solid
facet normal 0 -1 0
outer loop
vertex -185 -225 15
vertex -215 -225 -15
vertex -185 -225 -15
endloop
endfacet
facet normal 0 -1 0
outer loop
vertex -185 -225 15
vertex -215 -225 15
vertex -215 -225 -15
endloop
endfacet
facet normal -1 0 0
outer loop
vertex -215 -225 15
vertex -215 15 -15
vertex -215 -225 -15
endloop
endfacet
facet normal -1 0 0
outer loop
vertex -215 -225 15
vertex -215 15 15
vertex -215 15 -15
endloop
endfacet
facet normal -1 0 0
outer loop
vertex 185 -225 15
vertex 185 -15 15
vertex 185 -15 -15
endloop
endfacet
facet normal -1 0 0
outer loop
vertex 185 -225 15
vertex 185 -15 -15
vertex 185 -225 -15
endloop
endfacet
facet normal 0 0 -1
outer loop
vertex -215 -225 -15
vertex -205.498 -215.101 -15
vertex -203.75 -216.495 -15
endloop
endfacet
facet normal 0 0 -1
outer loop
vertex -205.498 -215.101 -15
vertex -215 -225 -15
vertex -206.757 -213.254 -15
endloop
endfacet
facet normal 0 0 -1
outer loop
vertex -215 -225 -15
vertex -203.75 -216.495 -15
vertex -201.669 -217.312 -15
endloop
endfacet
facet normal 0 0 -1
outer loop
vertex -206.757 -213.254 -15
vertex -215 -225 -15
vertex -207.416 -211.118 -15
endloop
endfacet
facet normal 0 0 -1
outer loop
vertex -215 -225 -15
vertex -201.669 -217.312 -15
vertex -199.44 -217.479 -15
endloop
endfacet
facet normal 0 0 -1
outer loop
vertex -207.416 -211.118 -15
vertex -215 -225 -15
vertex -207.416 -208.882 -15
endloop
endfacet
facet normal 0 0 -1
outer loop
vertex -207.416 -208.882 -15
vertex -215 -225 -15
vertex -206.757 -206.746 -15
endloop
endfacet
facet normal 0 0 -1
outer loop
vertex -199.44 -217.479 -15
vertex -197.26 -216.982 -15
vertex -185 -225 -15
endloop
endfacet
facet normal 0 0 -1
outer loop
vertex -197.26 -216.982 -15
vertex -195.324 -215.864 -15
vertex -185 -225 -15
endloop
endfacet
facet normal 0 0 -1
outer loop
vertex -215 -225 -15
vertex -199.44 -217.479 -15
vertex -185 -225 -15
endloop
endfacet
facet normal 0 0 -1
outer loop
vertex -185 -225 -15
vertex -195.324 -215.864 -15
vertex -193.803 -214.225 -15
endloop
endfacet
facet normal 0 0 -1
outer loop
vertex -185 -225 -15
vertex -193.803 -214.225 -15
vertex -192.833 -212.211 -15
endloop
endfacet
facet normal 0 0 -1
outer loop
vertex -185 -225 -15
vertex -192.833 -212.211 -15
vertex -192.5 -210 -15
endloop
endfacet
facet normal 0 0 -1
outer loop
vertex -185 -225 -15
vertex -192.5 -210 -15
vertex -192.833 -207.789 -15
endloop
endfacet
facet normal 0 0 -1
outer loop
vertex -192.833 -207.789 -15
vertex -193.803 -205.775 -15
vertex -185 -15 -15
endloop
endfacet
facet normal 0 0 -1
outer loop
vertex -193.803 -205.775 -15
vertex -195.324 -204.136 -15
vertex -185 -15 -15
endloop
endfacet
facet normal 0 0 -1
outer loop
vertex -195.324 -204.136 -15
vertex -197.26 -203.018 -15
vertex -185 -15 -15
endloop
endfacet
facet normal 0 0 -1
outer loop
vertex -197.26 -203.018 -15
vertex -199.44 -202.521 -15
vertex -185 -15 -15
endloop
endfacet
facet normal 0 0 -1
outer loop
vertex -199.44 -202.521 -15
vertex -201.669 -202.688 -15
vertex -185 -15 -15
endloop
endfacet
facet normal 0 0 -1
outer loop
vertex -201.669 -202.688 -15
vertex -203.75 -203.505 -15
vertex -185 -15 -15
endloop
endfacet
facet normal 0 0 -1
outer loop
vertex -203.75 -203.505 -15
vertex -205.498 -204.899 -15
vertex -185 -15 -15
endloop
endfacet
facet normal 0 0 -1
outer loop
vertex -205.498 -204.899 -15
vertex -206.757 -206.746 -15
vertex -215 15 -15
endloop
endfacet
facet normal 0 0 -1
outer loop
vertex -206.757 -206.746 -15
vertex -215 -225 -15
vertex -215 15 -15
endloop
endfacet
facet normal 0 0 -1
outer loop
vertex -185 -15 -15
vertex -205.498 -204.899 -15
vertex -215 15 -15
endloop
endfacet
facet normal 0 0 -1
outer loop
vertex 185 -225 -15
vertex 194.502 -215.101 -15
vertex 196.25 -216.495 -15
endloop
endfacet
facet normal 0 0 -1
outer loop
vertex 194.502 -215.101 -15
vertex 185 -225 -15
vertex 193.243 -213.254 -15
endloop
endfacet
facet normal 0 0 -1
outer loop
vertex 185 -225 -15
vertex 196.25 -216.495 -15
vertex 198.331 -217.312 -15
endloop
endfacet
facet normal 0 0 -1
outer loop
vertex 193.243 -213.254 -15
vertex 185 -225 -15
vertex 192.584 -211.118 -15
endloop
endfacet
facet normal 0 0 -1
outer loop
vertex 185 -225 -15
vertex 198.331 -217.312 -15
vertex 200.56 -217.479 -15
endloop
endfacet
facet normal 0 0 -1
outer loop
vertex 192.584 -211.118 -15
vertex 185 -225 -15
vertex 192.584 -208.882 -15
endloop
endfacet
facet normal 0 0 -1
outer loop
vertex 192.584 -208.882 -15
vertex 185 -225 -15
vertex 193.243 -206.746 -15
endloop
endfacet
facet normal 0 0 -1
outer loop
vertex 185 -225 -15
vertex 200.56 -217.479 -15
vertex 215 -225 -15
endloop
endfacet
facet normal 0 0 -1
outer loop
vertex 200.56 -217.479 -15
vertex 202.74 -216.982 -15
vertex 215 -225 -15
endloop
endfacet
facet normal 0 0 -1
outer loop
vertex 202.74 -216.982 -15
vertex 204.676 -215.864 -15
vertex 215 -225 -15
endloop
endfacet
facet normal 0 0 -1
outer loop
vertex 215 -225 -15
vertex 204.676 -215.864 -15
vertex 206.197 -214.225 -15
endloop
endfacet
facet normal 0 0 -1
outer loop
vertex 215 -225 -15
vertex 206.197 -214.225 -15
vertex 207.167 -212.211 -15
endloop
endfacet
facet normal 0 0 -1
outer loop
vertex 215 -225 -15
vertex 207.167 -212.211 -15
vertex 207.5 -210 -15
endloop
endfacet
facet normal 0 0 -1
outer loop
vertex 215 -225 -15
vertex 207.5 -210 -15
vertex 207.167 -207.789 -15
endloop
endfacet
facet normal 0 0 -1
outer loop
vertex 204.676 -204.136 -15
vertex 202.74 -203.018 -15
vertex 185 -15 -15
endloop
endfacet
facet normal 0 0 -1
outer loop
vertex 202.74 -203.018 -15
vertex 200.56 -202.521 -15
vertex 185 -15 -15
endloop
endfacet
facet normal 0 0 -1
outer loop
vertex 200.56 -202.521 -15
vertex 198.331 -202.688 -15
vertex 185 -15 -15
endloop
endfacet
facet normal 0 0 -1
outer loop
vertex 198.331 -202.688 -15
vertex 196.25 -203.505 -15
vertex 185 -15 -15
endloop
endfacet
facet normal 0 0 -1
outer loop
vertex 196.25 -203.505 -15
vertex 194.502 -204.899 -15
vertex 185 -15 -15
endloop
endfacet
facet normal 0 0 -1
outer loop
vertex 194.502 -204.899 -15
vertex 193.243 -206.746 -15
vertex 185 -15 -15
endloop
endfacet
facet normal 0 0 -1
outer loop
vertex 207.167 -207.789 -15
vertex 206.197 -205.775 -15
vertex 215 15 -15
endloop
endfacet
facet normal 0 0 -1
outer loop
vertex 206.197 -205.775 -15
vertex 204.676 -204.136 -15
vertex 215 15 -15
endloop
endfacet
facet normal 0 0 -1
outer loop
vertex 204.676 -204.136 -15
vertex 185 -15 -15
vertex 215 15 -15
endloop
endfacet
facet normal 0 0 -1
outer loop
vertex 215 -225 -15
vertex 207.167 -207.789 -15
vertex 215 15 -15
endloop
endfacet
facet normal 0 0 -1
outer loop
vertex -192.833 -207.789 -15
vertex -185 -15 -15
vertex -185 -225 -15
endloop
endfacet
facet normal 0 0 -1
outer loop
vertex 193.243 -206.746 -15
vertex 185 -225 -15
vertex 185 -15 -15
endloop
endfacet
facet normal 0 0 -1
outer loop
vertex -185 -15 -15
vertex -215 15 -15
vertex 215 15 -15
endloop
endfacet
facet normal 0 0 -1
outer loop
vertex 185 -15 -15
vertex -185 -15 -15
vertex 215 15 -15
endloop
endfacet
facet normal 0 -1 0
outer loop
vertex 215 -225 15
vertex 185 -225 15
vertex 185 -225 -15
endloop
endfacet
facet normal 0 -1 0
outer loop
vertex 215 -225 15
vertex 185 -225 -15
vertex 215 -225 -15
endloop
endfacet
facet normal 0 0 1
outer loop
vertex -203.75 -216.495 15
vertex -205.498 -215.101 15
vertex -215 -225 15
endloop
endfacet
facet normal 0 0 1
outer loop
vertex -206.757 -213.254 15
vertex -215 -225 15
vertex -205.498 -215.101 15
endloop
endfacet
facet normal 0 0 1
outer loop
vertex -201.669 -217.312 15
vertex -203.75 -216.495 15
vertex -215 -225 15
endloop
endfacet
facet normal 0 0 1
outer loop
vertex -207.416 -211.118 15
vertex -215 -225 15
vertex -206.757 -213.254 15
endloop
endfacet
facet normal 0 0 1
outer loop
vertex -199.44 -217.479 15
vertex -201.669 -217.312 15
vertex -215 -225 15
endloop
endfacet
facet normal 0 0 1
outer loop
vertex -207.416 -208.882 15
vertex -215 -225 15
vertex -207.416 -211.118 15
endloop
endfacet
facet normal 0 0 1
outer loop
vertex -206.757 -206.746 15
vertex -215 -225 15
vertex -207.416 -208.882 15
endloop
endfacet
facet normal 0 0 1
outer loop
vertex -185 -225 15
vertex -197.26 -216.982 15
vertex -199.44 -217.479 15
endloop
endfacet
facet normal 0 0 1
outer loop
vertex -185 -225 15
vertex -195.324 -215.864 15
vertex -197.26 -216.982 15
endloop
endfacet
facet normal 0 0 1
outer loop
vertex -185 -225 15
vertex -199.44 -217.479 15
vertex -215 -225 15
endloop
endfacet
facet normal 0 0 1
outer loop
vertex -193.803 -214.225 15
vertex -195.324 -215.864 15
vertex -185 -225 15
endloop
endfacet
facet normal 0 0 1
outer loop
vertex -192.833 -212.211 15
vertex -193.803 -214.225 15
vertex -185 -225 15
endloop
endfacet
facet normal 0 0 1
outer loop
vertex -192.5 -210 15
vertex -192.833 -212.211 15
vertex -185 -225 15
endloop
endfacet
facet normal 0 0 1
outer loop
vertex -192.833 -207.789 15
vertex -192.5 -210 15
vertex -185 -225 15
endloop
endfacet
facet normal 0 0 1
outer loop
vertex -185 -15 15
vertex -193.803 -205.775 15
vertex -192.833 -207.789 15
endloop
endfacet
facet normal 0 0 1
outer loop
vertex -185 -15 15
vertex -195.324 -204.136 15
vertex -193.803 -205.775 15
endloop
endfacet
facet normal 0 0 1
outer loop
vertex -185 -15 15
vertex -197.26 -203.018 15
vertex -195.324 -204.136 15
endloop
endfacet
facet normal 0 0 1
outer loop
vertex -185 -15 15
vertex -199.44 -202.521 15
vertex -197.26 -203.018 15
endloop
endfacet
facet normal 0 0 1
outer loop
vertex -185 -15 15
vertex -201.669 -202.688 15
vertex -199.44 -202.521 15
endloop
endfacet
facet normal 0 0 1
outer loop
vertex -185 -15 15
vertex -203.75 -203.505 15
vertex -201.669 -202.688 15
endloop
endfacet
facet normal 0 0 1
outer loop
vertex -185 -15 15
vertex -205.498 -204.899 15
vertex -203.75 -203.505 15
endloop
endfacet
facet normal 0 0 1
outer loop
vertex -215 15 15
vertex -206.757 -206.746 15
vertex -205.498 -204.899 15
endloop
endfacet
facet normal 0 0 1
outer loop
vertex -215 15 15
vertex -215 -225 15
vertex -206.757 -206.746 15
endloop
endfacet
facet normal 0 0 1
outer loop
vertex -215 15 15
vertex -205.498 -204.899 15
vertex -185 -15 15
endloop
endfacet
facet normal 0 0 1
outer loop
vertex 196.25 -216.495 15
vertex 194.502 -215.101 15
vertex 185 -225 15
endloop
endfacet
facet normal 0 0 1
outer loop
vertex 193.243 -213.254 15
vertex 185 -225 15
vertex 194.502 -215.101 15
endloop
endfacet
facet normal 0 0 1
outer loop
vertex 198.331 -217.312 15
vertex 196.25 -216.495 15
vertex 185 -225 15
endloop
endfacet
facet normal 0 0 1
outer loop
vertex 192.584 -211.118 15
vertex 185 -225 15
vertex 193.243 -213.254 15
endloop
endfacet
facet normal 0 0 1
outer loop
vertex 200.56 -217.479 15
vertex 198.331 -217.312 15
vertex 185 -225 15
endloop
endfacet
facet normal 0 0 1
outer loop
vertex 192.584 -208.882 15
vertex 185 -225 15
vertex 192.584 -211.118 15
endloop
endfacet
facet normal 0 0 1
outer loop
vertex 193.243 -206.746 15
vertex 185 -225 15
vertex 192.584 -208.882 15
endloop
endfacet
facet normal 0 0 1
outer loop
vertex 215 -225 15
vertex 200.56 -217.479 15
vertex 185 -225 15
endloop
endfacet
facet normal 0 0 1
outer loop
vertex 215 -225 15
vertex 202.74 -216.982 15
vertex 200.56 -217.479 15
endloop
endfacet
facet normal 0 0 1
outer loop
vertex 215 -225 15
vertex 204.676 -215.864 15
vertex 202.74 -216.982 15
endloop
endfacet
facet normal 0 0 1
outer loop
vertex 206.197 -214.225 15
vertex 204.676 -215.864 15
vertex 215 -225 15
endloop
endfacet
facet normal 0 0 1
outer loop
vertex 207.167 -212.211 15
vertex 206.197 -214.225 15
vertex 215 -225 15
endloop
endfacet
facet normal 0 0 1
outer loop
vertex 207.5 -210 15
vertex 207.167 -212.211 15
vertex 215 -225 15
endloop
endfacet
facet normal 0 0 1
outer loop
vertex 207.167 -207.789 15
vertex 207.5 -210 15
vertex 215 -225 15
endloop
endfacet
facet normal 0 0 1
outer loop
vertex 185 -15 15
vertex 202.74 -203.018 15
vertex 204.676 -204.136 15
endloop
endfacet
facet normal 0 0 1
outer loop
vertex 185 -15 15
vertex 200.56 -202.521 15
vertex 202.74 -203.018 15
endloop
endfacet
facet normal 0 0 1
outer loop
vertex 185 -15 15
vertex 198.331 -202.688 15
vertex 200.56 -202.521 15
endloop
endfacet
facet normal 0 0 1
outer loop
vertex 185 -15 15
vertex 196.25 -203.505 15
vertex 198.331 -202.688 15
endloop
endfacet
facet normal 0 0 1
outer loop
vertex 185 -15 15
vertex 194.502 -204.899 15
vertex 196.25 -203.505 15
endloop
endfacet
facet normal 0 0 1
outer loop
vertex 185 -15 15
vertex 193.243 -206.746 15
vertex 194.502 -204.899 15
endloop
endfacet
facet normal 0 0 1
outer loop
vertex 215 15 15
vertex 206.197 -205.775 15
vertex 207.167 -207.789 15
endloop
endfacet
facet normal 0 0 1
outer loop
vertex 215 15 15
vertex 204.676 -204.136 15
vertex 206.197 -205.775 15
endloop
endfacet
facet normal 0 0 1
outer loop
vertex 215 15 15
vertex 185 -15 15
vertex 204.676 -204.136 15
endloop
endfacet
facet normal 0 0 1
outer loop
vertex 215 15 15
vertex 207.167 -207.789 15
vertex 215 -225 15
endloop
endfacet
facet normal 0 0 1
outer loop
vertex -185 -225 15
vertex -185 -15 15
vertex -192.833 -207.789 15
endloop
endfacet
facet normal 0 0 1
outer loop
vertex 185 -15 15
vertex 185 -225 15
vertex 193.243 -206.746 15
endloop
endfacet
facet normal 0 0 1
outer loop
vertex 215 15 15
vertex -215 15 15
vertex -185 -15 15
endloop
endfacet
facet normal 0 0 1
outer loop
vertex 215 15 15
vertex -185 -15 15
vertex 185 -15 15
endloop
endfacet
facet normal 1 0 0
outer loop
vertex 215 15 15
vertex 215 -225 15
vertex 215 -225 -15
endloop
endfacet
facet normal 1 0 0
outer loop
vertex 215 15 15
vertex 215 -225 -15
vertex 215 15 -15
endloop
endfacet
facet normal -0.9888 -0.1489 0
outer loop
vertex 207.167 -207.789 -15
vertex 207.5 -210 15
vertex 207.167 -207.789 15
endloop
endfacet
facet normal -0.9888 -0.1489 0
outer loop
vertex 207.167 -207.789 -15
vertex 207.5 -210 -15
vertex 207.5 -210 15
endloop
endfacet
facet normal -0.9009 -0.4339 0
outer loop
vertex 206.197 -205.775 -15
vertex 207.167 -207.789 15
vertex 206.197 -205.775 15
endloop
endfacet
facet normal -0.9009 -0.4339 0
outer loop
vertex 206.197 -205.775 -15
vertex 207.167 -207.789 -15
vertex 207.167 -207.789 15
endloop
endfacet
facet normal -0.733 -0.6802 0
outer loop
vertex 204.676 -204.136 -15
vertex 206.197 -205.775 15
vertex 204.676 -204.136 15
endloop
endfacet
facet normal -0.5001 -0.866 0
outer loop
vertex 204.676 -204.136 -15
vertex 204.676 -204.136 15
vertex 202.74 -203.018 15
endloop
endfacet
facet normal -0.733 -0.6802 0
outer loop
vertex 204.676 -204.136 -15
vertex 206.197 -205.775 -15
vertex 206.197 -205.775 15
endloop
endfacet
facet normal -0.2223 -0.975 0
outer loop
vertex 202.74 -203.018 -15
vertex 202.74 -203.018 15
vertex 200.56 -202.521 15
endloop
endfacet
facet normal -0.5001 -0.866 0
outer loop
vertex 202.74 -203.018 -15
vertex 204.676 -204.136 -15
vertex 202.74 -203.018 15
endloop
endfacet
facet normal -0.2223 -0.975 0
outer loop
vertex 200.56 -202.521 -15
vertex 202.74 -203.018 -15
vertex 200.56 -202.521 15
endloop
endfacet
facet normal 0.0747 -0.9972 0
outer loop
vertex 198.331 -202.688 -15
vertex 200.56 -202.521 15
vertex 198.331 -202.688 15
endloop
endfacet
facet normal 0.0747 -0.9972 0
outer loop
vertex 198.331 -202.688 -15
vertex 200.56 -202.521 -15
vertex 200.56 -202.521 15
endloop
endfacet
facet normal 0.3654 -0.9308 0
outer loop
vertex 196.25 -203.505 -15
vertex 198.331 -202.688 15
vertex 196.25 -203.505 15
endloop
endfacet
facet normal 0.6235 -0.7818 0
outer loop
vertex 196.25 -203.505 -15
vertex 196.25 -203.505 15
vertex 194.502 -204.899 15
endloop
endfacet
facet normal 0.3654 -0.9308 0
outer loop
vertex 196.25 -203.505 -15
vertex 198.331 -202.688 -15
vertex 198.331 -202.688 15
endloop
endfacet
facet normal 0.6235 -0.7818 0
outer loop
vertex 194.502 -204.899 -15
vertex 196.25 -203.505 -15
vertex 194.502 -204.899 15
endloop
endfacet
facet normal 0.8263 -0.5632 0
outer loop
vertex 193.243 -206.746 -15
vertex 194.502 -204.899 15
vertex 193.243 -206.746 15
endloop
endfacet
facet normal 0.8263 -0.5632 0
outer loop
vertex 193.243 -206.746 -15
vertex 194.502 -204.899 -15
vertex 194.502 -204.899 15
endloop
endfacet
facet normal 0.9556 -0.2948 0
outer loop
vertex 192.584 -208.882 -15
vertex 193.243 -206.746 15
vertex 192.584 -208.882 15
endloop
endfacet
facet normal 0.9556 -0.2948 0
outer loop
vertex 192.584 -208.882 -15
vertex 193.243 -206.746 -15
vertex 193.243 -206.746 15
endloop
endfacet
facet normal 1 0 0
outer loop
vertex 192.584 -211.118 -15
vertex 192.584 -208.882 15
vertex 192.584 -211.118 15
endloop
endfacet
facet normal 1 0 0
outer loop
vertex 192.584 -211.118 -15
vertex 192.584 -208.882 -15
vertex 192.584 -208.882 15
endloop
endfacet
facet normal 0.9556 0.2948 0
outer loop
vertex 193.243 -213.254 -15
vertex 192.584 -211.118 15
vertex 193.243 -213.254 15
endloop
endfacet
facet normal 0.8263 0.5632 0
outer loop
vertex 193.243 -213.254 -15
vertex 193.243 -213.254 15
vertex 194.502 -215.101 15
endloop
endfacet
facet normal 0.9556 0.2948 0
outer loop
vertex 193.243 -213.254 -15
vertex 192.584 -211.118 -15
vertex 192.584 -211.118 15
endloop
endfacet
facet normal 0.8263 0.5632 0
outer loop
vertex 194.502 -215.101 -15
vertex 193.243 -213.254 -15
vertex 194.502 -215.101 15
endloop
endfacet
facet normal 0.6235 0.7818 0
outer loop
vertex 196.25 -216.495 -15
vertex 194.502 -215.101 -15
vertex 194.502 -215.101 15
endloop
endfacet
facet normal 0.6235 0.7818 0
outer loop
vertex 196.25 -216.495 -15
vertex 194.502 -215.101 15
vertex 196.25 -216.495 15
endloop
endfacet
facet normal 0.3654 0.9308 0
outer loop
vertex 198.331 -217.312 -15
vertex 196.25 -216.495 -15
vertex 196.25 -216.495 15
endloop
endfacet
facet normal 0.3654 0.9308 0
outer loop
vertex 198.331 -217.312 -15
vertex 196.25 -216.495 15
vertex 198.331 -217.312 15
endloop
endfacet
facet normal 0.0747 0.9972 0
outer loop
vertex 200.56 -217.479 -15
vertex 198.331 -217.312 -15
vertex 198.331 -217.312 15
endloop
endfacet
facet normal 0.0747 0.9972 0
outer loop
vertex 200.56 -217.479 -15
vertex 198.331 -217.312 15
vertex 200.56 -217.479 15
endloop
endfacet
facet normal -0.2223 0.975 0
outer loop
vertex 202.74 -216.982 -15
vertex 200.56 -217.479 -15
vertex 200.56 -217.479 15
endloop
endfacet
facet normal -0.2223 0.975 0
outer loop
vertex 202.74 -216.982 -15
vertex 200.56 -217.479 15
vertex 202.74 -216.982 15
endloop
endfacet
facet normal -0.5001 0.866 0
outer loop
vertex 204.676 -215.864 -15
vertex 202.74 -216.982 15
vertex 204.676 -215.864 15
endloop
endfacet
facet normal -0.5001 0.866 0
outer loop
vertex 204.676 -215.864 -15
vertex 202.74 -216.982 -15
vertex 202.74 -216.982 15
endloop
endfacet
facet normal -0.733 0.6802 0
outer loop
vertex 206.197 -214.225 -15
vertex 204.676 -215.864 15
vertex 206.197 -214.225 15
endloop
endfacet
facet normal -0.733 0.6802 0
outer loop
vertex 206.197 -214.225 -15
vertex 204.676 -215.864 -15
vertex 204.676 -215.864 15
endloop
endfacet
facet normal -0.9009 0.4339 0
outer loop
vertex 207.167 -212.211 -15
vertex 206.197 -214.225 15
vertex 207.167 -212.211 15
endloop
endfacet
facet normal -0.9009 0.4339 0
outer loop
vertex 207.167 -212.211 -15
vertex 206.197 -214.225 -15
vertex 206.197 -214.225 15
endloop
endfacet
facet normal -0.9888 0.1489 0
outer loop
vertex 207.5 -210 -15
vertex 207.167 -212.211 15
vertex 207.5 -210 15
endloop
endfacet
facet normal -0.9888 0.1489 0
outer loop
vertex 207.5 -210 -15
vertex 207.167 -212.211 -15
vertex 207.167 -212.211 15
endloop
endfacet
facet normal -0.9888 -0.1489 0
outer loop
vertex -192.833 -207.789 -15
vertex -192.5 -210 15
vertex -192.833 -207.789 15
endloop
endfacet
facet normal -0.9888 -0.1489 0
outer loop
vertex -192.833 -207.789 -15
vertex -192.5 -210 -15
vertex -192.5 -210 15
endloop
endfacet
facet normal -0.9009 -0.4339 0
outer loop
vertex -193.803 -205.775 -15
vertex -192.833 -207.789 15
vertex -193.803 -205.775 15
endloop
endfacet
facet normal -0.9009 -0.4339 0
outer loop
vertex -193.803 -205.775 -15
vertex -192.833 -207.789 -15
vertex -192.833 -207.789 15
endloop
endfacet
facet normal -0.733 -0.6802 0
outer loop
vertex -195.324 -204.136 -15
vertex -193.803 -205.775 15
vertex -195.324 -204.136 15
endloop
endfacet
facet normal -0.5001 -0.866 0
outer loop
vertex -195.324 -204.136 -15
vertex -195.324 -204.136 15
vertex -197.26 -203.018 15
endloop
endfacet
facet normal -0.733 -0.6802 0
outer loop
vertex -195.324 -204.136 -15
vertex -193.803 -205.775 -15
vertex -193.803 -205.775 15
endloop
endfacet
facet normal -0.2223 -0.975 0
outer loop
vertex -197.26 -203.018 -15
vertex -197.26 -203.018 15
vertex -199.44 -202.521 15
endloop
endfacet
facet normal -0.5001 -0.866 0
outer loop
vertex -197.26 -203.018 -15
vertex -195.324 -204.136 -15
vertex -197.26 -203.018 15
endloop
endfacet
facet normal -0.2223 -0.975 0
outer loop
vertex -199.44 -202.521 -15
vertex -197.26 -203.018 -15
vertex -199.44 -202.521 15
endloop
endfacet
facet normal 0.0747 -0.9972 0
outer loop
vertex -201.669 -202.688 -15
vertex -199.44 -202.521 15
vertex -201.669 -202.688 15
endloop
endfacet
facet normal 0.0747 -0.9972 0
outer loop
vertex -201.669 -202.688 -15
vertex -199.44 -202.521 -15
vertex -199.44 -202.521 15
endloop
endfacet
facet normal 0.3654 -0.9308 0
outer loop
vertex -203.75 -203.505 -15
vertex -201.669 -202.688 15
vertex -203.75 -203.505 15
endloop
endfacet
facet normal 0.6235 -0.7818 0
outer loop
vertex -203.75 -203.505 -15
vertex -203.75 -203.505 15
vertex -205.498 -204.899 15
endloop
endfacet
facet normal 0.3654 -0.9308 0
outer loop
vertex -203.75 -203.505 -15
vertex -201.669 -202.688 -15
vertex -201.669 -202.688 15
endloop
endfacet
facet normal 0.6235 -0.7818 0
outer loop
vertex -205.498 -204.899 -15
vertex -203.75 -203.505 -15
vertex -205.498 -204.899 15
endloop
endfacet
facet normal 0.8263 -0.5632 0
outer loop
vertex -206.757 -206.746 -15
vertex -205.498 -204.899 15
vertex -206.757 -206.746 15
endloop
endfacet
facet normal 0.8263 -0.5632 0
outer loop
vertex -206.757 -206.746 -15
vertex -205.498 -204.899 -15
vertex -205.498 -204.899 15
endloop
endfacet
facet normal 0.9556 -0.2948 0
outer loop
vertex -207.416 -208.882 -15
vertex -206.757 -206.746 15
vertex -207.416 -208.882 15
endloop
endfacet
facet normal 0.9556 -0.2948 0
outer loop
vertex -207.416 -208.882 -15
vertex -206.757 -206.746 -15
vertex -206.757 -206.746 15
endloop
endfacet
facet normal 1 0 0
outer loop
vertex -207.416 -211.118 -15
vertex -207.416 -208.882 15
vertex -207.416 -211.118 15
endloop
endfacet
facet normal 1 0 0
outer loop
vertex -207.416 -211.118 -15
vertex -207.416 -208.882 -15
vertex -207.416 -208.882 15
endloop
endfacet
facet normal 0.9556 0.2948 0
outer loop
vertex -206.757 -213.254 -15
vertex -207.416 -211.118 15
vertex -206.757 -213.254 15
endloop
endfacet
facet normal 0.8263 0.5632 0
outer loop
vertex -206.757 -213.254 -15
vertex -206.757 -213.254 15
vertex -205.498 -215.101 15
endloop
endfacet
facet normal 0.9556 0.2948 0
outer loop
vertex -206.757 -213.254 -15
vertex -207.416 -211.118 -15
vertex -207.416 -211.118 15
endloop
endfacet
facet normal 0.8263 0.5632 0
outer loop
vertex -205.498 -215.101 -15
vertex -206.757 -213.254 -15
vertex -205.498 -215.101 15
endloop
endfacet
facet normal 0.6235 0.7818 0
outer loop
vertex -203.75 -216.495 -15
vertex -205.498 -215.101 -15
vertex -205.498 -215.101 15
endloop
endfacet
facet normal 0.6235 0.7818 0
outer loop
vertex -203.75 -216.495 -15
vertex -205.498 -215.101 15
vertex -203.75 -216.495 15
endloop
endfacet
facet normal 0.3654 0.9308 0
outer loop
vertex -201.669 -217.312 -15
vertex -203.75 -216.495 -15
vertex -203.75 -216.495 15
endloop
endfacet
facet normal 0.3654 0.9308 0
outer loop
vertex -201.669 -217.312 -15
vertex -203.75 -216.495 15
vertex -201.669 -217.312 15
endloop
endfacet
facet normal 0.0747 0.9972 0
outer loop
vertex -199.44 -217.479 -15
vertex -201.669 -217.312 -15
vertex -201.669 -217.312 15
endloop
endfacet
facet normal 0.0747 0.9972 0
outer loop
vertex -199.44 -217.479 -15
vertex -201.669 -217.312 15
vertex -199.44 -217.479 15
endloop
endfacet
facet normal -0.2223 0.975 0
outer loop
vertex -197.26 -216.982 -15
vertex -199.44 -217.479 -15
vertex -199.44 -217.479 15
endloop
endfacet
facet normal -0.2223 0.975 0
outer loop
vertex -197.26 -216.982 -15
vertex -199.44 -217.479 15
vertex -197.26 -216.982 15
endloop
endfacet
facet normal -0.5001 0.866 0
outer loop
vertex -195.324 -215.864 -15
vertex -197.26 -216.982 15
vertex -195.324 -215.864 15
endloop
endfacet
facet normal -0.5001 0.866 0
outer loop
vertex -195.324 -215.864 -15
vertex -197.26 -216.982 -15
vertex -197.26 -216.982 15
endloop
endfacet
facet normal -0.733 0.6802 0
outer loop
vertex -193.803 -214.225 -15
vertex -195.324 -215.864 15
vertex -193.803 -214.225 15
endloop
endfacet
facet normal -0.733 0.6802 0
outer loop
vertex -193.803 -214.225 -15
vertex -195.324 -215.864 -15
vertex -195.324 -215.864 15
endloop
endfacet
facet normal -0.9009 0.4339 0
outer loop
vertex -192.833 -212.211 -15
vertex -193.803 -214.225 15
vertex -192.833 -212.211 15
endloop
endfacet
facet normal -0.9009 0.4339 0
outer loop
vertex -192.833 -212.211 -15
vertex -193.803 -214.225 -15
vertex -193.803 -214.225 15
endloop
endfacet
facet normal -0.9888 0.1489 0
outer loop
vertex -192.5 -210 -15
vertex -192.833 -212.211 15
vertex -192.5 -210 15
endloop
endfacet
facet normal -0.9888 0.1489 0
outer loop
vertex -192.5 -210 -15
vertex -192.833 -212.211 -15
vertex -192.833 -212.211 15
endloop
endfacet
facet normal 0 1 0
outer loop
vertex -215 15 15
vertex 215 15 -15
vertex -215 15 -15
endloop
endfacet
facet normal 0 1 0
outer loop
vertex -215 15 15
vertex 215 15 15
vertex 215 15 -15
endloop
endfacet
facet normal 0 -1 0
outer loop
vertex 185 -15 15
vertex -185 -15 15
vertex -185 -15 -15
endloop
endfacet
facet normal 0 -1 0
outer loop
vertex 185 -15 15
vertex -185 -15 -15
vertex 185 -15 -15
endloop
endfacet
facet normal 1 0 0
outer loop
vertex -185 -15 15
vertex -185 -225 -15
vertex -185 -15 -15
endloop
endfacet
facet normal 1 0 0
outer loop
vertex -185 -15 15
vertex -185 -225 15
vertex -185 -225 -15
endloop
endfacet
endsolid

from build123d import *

# Parameters (mm, degrees)
SKETCH1_R           = 7.5
BOSS_EXTRUDE1_DEPTH = 15


with BuildPart() as part:
    # Sketch1 → Boss-Extrude1 (new, symmetric)
    with BuildSketch(Plane.XY):
        Polygon((-185, -225), (-185, -15), (185, -15), (185, -225), (215, -225), (215, -15), (215, 15), (-215, 15), (-215, -15), (-215, -225), align=None)
        with Locations((-200, -210)):
            Circle(SKETCH1_R, mode=Mode.SUBTRACT)
        with Locations((200, -210)):
            Circle(SKETCH1_R, mode=Mode.SUBTRACT)
    extrude(amount=BOSS_EXTRUDE1_DEPTH, both=True)


solid = part.part
